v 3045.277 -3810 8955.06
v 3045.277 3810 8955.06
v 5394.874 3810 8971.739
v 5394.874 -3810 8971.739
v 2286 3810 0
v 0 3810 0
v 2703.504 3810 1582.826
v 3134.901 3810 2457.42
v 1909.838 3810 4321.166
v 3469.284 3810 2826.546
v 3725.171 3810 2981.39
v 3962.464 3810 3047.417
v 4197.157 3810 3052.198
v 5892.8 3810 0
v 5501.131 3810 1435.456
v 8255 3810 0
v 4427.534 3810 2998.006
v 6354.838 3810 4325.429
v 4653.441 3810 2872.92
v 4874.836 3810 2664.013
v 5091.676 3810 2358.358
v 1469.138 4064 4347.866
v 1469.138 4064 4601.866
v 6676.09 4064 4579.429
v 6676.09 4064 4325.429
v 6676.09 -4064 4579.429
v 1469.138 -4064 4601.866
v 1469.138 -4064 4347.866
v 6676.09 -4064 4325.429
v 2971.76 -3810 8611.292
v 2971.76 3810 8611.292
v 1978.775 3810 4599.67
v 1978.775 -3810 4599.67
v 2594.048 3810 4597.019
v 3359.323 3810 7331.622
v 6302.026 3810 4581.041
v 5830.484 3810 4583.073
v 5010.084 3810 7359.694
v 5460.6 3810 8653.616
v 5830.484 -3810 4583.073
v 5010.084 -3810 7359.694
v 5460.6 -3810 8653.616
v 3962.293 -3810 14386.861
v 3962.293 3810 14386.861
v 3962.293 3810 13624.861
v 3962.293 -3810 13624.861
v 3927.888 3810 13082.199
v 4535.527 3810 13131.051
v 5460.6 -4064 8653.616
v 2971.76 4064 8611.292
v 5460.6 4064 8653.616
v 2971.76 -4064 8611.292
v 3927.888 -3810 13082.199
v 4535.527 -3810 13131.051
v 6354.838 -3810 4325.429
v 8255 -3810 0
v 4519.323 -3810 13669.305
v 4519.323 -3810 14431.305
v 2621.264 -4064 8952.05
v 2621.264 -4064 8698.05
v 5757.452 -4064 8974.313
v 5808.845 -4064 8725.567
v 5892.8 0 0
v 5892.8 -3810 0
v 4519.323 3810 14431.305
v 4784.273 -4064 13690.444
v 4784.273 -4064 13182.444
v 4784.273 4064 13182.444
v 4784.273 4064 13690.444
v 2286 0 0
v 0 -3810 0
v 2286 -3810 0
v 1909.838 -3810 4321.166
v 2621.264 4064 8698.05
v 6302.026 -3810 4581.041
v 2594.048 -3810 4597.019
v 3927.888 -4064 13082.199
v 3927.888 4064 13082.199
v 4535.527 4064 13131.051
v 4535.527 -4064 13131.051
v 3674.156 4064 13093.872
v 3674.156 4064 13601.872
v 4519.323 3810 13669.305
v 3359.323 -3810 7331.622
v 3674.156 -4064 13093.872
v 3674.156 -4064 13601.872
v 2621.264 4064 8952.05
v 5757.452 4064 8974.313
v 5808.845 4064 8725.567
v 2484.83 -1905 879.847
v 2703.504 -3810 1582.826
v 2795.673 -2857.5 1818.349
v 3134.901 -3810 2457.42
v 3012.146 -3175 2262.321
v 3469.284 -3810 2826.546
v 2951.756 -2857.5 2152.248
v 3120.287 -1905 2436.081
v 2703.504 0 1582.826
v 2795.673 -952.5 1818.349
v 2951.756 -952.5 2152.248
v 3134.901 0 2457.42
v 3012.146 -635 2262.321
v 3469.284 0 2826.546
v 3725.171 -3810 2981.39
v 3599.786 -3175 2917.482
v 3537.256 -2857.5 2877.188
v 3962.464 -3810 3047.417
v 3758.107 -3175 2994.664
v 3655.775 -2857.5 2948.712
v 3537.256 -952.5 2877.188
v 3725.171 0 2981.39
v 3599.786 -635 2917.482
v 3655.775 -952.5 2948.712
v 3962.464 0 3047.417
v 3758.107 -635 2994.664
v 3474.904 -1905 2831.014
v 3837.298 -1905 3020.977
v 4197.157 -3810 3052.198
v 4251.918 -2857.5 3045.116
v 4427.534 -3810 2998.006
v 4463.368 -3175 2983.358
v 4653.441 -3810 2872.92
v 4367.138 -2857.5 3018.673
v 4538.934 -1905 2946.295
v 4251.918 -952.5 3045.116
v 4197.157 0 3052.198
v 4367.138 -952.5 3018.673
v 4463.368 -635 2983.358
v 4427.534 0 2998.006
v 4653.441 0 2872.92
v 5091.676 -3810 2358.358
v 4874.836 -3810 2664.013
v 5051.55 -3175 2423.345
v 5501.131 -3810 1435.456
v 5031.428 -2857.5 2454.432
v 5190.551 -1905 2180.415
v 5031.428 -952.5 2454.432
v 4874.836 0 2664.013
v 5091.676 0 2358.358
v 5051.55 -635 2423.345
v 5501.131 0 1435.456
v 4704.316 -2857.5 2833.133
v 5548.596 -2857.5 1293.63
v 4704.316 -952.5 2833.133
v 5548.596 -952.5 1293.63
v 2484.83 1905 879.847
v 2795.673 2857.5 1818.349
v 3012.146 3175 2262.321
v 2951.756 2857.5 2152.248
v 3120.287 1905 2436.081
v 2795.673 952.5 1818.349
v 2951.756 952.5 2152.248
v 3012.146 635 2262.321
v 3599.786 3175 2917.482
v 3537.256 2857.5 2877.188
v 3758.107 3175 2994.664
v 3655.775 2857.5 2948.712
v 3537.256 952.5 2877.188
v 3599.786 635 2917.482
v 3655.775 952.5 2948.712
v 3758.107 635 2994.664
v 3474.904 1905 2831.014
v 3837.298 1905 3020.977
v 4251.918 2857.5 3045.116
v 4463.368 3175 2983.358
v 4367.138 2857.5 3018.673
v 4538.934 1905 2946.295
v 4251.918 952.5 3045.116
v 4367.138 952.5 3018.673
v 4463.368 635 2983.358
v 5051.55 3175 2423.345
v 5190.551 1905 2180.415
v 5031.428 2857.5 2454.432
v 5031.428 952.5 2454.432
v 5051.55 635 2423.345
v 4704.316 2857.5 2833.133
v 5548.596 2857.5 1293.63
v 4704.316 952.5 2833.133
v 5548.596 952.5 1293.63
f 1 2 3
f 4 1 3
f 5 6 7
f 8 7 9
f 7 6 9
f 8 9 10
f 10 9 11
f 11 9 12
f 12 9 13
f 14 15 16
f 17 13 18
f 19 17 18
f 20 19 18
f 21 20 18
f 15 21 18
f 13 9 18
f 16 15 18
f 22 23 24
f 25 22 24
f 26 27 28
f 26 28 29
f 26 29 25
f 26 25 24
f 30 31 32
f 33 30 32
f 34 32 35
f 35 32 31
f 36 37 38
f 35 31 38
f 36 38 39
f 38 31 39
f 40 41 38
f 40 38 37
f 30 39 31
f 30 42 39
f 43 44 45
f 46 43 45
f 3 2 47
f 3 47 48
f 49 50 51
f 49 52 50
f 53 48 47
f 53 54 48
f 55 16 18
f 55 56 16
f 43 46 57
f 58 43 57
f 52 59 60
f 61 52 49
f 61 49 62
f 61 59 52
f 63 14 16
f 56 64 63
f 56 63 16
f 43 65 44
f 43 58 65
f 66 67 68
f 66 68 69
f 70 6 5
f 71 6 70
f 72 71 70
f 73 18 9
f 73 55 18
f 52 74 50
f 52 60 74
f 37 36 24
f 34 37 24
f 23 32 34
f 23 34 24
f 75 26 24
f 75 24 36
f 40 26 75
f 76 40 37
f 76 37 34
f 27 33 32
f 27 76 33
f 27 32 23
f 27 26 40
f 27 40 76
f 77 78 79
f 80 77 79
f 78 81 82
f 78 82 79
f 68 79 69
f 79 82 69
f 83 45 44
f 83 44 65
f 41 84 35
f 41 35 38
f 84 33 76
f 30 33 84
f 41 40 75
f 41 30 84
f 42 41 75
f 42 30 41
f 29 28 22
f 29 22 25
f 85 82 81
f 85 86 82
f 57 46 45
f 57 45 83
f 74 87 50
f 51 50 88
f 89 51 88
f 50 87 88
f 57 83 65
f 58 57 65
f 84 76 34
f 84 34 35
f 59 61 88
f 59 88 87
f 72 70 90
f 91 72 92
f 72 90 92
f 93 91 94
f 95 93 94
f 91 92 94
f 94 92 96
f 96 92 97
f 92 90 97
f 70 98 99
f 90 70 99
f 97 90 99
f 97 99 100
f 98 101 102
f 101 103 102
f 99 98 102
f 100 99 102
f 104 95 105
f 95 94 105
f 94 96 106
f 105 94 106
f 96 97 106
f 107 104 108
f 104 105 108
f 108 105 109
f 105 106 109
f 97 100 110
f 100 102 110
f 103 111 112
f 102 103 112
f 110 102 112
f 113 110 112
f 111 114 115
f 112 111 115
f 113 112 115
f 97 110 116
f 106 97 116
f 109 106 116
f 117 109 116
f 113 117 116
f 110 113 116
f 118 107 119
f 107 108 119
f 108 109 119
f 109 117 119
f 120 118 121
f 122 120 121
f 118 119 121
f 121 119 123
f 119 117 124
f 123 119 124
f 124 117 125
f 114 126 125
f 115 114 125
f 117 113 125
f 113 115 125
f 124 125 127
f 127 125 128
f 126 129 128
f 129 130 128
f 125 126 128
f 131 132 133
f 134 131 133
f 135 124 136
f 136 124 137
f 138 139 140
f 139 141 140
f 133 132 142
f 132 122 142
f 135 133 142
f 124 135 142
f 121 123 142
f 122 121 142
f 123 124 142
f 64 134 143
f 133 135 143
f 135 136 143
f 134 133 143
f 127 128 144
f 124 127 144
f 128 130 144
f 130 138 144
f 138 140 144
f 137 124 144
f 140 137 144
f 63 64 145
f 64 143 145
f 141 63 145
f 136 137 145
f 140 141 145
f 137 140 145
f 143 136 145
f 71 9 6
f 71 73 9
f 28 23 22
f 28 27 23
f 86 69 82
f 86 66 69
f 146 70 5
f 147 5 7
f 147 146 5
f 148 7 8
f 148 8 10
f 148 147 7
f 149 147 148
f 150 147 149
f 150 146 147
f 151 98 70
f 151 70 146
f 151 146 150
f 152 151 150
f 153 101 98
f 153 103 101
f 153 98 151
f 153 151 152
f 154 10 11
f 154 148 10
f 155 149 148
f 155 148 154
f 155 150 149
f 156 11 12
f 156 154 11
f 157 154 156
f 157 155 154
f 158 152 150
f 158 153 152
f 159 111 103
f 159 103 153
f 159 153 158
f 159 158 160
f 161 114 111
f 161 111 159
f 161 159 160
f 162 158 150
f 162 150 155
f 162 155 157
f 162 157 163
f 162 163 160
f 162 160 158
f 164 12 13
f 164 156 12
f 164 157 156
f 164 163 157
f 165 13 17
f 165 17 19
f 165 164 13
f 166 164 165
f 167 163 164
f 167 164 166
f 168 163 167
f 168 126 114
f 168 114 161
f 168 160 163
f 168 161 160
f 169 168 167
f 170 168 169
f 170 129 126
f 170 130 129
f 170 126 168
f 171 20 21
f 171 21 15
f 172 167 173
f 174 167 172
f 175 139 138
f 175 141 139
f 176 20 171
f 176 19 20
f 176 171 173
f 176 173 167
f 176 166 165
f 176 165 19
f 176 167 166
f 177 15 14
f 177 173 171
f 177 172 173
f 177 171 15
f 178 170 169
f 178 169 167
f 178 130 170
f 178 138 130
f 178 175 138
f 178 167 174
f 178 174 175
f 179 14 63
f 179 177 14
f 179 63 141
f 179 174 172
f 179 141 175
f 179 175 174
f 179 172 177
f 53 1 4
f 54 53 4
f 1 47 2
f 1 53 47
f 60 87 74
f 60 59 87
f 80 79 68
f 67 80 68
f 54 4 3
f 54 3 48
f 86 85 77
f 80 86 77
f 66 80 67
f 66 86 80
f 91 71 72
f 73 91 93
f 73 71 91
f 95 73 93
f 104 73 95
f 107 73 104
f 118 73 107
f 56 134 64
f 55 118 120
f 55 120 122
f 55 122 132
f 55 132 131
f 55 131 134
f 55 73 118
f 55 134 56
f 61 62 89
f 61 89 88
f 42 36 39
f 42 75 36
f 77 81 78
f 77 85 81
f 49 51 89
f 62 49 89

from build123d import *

# Parameters (mm, degrees)
F1_DEPTH = 3810
F2_DEPTH = 4064
F3_DEPTH = 4064


with BuildPart() as f1:
    # F0 (on Front) → F1 (new body, symmetric)
    with BuildSketch(Plane.XZ):
        Polygon((3962.2926947661, 14386.861276684), (3962.2926947661, 13624.861276684), (4519.3225083359, 13669.3048003329), (4519.3225083359, 14431.3048003329), align=None)
    extrude(amount=F1_DEPTH, both=True)


with BuildPart() as f1b:
    # F0 (on Front) → F1, piece 2 (new body, symmetric)
    with BuildSketch(Plane.XZ):
        Polygon((3927.887741484, 13082.1987645631), (3045.2767241419, 8955.0596301024), (5394.8737459492, 8971.7391000787), (4535.5270933105, 13131.0513807869), align=None)
    extrude(amount=F1_DEPTH, both=True)


with BuildPart() as f1c:
    # F0 (on Front) → F1, piece 3 (new body, symmetric)
    with BuildSketch(Plane.XZ):
        Polygon((2971.7602322705, 8611.2923479486), (1978.7751916019, 4599.6699502344), (2594.0482501344, 4597.0187600642), (3359.3227863312, 7331.6221237183), (5010.0841125311, 7359.6942437446), (5830.4841524302, 4583.0730705337), (6302.0264863643, 4581.0412110475), (5460.600385618, 8653.6164673729), align=None)
    extrude(amount=F1_DEPTH, both=True)

    # F0 (on Front) → F2 (join, symmetric)
    with BuildSketch(Plane.XZ):
        Polygon((1978.7751916019, 4599.6699502344), (1915.9703087599, 4345.9405742862), (6354.5516468159, 4326.8148819613), (6302.0264863643, 4581.0412110475), (5830.4841524302, 4583.0730705337), (2594.0482501344, 4597.0187600642), align=None)
        Polygon((1469.138337915, 4347.8659576788), (1915.9703087599, 4345.9405742862), (1978.7751916019, 4599.6699502344), (1469.138337915, 4601.8659576788), align=None)
        Polygon((6302.0264863643, 4581.0412110475), (6354.5516468159, 4326.8148819613), (6676.0899989331, 4325.4293844059), (6676.0899989331, 4579.4293844059), align=None)
    extrude(amount=F2_DEPTH, both=True)


with BuildPart() as f1d:
    # F0 (on Front) → F1, piece 4 (new body, symmetric)
    with BuildSketch(Plane.XZ):
        with BuildLine():
            Line((1909.8379015153, 4321.1658785489), (0, 0))
            Line((0, 0), (2286, 0))
            add(Edge.make_bspline(
                [(2286, 0), (2759.3298407348, 2457.1255667936), (4156.1876931975, 3664.5077452441), (5350.7589243341, 2441.5044118267), (5892.8, 0)],
                knots=[0, 0, 0, 0, 0.5006396986, 1, 1, 1, 1], degree=3))
            Line((5892.8, 0), (8255, 0))
            Line((8255, 0), (6354.8379015153, 4325.4293844059))
            Line((6354.8379015153, 4325.4293844059), (1909.8379015153, 4321.1658785489))
        make_face()
    extrude(amount=F1_DEPTH, both=True)


with BuildPart() as f3:
    # F0 (on Front) → F3 (new body, symmetric)
    with BuildSketch(Plane.XZ):
        Polygon((3045.2767241419, 8955.0596301024), (2971.7602322705, 8611.2923479486), (5460.600385618, 8653.6164673729), (5394.8737459492, 8971.7391000787), align=None)
        Polygon((5394.8737459492, 8971.7391000787), (5460.600385618, 8653.6164673729), (5808.845323328, 8725.5666123301), (5757.4523626443, 8974.3129964087), align=None)
        Polygon((2621.2640921677, 8698.0496220461), (2971.7602322705, 8611.2923479486), (3045.2767241419, 8955.0596301024), (2621.2640921677, 8952.0496220461), align=None)
    extrude(amount=F3_DEPTH, both=True)


with BuildPart() as f3b:
    # F0 (on Front) → F3, piece 2 (new body, symmetric)
    with BuildSketch(Plane.XZ):
        Polygon((3674.1561126888, 13093.8718339509), (3927.887741484, 13082.1987645631), (4535.5270933105, 13131.0513807869), (4784.2734773891, 13182.4443414707), (4784.2734773891, 13690.4443414707), (4519.3225083359, 13669.3048003329), (3962.2926947661, 13624.861276684), (3674.1561126888, 13601.8718339509), align=None)
    extrude(amount=F3_DEPTH, both=True)


solid = Compound([f1.part, f1b.part, f1c.part, f1d.part, f3.part, f3b.part])
